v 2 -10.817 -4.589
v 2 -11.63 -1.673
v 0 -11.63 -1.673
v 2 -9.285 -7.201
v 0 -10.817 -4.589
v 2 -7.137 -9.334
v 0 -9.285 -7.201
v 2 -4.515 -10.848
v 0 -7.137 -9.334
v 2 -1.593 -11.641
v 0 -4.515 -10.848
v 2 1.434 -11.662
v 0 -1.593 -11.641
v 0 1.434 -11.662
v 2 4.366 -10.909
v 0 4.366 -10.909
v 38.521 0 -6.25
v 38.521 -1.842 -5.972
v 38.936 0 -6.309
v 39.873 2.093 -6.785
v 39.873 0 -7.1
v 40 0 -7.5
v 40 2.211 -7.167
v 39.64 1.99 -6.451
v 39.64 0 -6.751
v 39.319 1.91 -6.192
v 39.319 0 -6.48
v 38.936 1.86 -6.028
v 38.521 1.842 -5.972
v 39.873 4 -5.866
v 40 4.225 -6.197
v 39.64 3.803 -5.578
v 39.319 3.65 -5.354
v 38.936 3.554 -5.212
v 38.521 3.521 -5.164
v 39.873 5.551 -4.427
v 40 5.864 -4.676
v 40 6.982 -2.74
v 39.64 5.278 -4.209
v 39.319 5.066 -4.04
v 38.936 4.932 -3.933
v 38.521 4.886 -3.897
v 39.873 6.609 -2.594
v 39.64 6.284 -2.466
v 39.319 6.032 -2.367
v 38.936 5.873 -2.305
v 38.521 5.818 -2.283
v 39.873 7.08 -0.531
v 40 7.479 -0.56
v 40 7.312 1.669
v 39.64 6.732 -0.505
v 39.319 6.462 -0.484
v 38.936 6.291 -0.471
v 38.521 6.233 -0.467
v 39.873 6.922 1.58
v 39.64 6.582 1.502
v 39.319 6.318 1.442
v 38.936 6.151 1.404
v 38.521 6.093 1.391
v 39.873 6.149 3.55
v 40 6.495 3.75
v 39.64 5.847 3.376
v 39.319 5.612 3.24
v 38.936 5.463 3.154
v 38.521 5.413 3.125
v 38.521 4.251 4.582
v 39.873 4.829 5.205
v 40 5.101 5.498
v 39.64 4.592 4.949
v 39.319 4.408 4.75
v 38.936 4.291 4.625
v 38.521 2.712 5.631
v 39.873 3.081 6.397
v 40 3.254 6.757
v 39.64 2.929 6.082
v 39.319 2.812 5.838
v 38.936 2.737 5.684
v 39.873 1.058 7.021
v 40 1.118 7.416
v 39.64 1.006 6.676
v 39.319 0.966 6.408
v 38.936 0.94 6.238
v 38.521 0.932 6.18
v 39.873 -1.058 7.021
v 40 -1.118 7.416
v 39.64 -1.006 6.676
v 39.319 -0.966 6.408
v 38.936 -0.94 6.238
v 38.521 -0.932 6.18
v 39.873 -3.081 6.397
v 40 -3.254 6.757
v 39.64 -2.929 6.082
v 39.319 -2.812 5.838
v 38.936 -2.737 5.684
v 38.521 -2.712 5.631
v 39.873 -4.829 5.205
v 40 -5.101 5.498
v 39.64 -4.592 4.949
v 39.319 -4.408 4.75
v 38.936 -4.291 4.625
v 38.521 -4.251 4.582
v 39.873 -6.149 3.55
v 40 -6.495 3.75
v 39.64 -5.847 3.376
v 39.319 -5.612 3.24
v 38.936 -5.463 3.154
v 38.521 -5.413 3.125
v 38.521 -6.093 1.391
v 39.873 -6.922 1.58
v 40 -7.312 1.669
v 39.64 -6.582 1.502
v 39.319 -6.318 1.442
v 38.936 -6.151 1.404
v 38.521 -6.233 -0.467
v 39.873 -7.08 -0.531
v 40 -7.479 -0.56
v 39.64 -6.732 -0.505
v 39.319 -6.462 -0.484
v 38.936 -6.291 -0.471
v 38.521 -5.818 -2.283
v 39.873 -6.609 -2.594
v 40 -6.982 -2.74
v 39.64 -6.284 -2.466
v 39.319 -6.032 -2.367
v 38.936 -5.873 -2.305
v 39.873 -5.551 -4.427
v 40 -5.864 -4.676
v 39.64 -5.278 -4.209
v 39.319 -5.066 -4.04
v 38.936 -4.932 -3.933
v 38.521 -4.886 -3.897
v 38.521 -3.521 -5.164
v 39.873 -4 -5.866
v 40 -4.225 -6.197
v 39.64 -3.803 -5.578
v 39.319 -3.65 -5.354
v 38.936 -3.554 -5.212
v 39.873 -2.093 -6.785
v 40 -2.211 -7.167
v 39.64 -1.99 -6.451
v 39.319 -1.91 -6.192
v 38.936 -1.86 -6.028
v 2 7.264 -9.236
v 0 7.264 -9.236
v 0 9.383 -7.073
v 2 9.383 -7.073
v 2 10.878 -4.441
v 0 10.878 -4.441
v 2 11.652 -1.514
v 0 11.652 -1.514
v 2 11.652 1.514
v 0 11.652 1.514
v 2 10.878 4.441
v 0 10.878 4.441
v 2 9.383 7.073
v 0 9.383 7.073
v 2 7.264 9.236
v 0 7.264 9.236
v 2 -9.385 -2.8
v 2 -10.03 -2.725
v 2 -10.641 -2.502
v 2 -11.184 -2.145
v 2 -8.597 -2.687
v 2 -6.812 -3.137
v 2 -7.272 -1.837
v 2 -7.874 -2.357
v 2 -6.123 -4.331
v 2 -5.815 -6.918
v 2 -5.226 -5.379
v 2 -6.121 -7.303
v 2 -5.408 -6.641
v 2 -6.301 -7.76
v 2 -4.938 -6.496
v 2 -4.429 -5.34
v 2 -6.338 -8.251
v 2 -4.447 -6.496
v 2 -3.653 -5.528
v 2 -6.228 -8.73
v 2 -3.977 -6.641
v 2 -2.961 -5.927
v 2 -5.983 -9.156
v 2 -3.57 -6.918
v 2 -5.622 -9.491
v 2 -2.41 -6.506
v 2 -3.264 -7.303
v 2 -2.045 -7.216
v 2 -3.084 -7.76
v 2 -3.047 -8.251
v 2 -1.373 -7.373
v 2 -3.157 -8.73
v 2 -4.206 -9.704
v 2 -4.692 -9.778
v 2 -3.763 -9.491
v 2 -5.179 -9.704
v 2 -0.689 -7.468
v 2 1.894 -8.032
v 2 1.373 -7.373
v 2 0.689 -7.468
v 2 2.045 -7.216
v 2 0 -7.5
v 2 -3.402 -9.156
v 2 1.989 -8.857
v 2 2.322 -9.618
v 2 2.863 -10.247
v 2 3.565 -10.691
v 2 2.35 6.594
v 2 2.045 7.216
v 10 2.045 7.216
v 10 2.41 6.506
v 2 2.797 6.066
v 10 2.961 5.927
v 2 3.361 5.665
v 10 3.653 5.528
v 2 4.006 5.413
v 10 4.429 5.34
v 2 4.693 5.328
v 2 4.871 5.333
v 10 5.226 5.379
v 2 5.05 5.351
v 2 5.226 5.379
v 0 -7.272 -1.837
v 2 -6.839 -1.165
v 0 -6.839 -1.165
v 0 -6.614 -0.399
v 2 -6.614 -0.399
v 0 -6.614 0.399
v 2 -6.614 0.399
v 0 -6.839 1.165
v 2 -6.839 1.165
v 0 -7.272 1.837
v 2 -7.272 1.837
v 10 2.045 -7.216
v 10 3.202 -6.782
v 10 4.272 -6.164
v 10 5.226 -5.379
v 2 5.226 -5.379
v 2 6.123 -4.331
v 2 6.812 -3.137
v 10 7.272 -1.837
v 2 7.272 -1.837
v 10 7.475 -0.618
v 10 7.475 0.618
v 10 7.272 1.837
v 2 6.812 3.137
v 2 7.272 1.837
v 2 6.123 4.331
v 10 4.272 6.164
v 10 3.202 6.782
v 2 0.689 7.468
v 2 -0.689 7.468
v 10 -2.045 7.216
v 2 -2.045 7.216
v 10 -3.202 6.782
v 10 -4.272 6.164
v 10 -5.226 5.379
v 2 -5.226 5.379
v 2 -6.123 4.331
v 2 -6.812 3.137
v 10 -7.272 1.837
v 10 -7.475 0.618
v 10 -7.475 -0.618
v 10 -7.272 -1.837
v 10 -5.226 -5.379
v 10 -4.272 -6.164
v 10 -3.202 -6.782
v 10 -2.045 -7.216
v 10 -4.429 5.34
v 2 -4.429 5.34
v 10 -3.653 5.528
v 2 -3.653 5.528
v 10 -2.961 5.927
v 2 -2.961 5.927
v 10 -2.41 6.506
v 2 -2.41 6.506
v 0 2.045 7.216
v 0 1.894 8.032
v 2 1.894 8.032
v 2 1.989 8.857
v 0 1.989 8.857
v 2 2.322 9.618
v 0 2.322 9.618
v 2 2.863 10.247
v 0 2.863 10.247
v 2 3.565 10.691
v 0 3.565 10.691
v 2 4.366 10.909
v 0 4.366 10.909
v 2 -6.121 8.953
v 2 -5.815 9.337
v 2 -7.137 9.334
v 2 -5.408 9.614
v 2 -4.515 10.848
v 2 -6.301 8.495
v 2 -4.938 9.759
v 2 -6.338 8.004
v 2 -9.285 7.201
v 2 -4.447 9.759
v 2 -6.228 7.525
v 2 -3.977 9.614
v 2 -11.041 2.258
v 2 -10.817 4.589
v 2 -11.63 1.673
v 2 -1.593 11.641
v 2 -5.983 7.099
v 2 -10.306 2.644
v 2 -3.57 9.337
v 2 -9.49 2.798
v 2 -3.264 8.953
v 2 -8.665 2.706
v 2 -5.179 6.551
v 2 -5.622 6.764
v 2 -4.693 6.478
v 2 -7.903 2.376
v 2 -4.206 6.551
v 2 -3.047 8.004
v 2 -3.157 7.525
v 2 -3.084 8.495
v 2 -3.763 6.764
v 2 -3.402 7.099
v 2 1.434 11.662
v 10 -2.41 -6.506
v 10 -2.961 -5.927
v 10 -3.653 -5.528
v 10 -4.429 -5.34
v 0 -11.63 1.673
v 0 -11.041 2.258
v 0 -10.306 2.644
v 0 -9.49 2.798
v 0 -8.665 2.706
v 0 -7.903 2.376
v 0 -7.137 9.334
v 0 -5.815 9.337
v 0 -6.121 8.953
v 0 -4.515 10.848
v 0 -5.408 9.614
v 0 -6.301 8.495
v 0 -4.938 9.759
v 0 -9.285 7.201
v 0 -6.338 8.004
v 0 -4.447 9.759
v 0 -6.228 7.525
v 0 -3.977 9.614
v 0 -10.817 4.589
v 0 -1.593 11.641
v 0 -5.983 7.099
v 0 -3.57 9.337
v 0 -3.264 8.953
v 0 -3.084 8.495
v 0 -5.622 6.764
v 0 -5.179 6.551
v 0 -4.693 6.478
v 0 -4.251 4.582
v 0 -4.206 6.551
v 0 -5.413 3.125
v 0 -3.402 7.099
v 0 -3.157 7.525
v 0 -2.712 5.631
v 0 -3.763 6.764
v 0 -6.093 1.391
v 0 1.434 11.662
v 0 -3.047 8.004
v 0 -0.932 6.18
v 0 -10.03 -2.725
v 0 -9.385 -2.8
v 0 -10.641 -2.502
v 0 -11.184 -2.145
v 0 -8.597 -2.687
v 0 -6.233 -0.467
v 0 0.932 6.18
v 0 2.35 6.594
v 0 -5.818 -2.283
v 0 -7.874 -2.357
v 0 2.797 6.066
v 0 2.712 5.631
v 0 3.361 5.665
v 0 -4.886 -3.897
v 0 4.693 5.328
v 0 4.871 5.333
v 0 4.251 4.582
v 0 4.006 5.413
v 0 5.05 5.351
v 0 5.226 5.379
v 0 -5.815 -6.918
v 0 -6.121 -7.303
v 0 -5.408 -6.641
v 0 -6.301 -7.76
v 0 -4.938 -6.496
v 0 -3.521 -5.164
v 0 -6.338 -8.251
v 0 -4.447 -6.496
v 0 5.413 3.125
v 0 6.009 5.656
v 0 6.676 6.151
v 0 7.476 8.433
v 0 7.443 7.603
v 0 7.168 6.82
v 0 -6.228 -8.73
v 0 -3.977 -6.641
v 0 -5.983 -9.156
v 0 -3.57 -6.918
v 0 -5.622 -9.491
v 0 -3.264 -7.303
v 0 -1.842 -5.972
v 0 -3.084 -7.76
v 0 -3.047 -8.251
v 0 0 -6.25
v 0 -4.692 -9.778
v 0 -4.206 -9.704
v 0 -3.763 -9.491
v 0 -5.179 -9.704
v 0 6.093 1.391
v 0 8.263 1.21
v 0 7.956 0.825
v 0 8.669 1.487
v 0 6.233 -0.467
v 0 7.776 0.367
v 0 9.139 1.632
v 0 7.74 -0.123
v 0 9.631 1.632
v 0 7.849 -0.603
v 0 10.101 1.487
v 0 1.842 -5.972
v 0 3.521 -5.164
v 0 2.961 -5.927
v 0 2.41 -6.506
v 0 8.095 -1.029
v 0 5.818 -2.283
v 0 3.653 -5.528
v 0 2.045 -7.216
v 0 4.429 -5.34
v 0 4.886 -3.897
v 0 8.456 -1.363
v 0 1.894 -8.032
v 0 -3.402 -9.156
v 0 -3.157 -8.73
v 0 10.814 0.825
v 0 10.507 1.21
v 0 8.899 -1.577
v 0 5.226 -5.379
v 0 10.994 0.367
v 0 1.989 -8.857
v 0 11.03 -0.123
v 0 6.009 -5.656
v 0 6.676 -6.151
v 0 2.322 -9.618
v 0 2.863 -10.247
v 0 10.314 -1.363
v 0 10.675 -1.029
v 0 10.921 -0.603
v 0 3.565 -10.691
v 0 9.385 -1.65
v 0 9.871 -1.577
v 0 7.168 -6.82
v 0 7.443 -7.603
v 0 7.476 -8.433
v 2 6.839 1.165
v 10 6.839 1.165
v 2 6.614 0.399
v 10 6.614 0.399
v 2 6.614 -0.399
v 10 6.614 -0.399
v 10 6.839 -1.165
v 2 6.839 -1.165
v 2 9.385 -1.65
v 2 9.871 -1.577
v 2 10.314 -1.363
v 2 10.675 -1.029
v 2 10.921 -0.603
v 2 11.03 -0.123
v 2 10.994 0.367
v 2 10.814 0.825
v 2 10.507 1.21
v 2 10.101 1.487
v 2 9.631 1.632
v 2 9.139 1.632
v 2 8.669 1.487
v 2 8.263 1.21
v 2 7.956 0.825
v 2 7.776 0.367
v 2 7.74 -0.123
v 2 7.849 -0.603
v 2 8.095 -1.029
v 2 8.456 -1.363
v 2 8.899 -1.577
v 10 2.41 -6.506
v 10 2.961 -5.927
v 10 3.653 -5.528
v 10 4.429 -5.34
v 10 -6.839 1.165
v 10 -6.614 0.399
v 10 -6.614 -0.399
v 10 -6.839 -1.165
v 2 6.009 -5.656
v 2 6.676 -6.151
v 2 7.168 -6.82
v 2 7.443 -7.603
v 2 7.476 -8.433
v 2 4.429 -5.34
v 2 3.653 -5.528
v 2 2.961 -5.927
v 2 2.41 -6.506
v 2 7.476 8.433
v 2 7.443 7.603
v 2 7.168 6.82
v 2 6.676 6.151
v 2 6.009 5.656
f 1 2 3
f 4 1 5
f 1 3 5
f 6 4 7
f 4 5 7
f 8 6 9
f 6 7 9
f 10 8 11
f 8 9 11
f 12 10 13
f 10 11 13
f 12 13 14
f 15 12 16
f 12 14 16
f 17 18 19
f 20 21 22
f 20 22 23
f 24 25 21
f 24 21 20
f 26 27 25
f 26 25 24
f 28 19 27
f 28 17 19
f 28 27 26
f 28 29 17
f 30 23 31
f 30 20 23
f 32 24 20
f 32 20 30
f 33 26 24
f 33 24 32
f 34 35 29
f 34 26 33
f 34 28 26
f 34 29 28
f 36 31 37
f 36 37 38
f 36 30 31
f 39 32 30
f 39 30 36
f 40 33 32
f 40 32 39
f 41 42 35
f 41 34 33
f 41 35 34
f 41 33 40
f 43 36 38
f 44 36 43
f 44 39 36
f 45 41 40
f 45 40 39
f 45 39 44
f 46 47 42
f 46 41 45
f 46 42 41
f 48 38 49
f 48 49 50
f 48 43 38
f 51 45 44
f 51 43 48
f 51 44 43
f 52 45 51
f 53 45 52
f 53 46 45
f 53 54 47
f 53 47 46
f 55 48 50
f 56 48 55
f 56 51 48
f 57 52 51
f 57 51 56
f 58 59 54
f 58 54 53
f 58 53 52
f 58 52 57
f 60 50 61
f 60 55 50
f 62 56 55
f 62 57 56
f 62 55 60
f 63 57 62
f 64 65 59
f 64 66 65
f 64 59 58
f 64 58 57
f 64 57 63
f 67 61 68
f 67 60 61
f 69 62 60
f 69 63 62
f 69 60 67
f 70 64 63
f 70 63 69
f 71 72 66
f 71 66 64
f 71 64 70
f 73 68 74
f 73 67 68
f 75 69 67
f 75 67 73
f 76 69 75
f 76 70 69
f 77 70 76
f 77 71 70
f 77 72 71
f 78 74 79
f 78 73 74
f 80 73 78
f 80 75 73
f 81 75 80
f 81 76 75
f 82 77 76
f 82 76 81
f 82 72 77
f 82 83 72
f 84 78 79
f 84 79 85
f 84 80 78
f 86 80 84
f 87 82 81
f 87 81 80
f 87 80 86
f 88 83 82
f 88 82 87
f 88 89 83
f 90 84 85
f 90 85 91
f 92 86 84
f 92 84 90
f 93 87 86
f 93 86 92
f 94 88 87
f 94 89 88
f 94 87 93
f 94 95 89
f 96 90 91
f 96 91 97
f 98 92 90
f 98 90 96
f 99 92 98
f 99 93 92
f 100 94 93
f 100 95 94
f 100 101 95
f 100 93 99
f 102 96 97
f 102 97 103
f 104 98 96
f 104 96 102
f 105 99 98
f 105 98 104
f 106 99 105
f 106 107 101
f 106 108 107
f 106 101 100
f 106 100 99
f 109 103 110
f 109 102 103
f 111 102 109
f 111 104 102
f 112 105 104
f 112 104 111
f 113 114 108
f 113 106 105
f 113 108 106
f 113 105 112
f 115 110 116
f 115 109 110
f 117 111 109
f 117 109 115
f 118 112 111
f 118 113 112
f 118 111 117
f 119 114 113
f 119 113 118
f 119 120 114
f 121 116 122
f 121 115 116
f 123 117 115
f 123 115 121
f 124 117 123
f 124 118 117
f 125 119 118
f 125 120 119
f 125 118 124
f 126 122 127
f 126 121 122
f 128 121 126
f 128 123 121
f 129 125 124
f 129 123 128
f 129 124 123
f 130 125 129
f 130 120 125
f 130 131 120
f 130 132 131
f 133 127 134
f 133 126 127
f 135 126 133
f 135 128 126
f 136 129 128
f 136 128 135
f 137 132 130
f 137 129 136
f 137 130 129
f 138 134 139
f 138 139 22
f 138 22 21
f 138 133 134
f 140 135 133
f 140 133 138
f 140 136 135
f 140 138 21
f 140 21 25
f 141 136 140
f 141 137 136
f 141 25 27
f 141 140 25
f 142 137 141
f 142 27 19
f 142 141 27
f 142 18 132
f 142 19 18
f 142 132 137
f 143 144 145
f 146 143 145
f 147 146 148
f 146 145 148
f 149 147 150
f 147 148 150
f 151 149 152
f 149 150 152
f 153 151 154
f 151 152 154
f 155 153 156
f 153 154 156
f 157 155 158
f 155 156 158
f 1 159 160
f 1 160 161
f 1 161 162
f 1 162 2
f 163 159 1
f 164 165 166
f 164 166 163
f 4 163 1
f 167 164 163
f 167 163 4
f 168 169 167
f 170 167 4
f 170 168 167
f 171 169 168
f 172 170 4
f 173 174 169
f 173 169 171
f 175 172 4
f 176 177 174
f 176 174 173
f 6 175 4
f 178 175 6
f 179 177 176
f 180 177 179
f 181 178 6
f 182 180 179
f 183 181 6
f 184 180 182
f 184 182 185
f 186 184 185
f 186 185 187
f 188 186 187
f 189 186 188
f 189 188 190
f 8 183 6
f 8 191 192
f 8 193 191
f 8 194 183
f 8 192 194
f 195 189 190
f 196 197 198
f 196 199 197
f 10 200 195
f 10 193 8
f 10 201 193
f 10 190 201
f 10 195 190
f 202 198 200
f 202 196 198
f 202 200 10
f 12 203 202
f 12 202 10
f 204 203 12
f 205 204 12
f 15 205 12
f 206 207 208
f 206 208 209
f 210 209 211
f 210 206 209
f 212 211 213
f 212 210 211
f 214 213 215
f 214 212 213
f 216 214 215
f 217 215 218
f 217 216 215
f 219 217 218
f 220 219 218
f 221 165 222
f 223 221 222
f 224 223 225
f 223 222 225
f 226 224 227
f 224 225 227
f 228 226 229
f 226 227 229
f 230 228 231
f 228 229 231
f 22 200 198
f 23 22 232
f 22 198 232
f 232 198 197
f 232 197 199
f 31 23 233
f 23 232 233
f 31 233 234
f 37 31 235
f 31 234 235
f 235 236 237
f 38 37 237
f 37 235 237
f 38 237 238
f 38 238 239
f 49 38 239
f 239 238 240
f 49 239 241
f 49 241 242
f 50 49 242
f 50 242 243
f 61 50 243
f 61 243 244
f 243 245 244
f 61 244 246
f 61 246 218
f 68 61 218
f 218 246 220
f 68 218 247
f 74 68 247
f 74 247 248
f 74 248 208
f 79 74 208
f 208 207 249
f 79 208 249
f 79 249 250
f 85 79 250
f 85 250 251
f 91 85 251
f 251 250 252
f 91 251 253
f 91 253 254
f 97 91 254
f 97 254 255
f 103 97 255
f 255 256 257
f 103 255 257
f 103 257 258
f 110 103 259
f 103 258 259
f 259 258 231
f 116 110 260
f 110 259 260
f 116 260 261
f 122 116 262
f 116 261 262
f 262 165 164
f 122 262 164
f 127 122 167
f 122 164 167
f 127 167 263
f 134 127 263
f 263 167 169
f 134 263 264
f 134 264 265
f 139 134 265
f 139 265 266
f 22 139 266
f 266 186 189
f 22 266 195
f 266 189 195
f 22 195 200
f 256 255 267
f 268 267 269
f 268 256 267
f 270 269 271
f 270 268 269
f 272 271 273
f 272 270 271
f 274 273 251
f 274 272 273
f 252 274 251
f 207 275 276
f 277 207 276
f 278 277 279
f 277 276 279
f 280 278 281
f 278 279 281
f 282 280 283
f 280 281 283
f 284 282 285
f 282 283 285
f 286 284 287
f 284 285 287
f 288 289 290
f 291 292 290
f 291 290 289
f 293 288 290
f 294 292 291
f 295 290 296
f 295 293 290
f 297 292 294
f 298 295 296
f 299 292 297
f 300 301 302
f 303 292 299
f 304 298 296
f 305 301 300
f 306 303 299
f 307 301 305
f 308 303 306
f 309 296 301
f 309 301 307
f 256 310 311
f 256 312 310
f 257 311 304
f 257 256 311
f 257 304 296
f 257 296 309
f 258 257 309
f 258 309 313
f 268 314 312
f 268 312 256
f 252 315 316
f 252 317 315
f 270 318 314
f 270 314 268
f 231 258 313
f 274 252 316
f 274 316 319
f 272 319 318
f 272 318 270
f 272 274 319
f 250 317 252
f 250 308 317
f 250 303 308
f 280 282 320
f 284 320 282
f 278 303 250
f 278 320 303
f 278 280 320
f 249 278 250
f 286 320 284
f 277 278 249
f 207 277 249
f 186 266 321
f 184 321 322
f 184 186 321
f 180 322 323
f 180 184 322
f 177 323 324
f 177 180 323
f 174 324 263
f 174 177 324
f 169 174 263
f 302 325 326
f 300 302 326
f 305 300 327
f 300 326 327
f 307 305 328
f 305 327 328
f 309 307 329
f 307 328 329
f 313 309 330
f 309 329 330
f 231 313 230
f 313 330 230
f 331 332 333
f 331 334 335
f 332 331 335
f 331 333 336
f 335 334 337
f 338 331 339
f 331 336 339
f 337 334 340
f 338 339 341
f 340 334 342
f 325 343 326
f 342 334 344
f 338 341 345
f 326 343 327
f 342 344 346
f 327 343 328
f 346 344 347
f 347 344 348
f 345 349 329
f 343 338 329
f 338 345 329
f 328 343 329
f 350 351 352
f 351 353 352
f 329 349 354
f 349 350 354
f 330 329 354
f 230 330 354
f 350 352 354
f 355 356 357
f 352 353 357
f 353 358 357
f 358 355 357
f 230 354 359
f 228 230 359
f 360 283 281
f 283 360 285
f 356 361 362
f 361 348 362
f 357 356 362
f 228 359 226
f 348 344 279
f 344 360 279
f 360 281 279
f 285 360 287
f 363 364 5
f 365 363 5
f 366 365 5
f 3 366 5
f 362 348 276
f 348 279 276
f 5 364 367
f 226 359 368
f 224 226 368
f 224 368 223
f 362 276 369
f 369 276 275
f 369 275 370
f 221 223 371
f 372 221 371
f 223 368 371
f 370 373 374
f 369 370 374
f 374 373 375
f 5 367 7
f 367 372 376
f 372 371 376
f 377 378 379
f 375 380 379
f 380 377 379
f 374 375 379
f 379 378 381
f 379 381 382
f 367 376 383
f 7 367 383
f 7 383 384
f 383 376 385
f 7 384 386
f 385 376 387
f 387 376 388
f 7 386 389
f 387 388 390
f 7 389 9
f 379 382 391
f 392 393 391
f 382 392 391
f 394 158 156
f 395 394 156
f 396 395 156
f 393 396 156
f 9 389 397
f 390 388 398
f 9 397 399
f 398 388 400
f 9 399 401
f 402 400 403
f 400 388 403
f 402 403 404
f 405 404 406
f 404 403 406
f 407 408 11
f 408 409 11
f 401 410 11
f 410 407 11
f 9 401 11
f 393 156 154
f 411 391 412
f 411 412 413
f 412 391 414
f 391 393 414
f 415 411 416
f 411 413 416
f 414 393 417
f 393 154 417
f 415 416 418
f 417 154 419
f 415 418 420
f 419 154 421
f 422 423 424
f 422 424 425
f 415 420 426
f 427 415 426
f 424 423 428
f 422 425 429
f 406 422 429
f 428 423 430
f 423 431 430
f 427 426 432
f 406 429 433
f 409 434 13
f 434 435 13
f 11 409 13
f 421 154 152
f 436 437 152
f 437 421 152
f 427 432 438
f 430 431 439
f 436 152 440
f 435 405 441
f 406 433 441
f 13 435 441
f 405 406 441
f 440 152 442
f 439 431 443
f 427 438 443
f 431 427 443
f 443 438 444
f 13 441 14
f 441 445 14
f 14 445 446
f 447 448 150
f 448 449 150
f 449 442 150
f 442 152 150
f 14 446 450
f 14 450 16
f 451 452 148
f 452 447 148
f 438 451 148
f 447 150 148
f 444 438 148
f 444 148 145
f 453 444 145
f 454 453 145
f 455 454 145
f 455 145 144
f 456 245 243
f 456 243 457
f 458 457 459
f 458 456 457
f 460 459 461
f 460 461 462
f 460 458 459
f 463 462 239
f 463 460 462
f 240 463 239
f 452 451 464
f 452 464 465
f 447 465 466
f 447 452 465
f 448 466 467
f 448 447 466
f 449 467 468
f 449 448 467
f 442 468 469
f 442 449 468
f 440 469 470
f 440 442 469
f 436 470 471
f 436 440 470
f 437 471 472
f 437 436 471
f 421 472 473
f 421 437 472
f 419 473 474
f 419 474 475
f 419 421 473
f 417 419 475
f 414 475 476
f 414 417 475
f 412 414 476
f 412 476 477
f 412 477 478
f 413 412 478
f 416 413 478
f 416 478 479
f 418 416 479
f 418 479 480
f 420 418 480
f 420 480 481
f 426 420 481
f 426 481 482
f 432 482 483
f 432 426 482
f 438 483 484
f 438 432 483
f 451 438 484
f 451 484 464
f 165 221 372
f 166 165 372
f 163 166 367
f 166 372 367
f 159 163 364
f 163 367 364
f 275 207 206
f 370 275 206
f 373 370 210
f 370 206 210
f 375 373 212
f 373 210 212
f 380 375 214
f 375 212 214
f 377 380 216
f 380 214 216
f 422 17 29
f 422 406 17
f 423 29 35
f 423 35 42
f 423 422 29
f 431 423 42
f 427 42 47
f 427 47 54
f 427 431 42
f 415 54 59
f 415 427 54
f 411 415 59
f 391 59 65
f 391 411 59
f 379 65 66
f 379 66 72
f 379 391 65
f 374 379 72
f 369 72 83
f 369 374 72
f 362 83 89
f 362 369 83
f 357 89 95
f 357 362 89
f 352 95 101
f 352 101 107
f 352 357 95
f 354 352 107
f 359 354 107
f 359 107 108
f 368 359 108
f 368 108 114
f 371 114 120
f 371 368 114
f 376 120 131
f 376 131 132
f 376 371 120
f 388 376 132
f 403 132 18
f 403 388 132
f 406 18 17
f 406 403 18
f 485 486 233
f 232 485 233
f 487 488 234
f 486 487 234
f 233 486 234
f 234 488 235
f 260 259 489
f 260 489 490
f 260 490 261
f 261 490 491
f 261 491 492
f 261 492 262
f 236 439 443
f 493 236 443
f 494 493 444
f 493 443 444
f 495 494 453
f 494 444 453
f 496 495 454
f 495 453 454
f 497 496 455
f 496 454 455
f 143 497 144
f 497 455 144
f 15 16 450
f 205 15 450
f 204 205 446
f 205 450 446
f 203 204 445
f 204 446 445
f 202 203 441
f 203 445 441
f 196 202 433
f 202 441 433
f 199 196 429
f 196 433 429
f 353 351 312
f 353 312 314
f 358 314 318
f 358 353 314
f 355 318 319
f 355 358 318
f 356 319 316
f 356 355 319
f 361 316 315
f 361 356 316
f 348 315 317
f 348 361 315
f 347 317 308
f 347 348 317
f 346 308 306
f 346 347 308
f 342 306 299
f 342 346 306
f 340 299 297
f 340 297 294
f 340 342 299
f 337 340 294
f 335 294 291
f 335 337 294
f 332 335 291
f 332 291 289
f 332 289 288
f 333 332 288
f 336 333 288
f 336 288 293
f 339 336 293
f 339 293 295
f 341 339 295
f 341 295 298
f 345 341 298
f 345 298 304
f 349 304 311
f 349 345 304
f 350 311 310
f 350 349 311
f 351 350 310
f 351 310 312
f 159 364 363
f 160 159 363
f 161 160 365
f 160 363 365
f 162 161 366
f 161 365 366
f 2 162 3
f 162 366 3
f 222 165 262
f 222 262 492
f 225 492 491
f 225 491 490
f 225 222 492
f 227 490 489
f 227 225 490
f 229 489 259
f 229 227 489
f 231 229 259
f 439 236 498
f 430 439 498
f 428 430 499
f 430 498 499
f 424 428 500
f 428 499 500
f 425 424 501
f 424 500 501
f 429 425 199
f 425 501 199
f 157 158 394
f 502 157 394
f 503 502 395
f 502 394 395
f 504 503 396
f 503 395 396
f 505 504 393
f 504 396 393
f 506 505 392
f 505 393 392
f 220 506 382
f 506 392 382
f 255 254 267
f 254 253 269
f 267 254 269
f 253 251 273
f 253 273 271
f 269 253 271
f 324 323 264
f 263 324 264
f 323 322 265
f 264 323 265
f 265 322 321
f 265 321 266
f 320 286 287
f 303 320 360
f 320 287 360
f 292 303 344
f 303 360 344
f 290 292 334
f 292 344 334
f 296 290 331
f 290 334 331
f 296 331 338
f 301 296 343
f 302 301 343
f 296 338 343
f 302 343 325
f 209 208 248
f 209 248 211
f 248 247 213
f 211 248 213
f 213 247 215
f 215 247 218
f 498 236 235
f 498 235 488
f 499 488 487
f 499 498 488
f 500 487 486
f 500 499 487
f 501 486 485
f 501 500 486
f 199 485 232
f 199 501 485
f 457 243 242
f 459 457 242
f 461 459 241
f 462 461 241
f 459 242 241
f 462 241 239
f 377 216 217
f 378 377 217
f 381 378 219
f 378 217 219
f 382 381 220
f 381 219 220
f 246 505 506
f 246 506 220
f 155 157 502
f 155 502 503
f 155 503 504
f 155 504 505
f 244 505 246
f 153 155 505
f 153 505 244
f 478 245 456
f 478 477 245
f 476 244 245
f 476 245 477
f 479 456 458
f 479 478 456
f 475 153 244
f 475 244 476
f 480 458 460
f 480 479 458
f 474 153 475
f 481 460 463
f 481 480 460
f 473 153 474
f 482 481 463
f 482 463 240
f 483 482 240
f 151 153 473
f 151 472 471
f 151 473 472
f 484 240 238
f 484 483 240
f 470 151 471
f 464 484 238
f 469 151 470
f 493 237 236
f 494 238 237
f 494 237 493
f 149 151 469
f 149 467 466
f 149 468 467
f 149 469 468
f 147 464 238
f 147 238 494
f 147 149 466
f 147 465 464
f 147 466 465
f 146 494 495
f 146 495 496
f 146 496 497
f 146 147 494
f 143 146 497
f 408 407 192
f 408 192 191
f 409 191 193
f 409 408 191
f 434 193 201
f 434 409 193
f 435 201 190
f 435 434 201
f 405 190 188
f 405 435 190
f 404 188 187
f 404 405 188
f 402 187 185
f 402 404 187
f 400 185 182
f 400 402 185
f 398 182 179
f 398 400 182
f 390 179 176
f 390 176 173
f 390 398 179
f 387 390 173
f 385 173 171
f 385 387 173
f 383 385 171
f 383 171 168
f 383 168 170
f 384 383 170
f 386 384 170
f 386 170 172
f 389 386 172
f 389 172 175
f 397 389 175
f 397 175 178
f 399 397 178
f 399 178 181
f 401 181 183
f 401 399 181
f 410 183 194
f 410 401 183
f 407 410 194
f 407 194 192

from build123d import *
from build123d.topology import SkipClean

# Parameters (mm, degrees)
SKETCH1_R                 = 1.6500000000000006
SKETCH1_R_2               = 6.25
SKETCH1_R_3               = 1.6500000000000004
BOSS_EXTRUDE1_DEPTH       = 2
BOSS_EXTRUDE2_START       = 2
BOSS_EXTRUDE2_OUTLINE_R   = 7.5
BOSS_EXTRUDE2_OUTLINE_R_2 = 6.25
BOSS_EXTRUDE2_DEPTH       = 38
CUT_EXTRUDE2_START        = 2
SKETCH1_4_R               = 2.8
SKETCH1_4_R_2             = 2.8000000000000003
SKETCH1_4_R_3             = 2.7999999999999994
SKETCH1_4_R_4             = 2.8000000000000016
CUT_EXTRUDE2_DEPTH        = 8
CUT_EXTRUDE3_START        = 2
SKETCH1_5_R               = 2.8
SKETCH1_5_R_2             = 2.7999999999999994
SKETCH1_5_R_3             = 2.8000000000000016
CUT_EXTRUDE3_DEPTH        = 46.314258622305886
FILLET1_R                 = 1.5


# Read off the part's stored shape, not the designer's step: Boss-Extrude2
with BuildPart() as part:
    # Sketch1 → Boss-Extrude1 (new body)
    with BuildSketch(Plane(origin=(0, 0, 0), x_dir=(0, 0, -1), z_dir=(1, 0, 0))):
        with BuildLine():
            ThreePointArc((-9.235679756024062, 7.263932780812693), (-6.819714318196267, 7.1682440093196265), (-5.379034853060263, 5.226469558848167))
            ThreePointArc((-5.37903485305997, 5.226469558848125), (-6.495190528383201, 3.7500000000001563), (-7.215772836598412, 2.0451460511681123))
            ThreePointArc((-7.215772836598439, 2.0451460511681465), (-9.617738571694561, 2.3219238414507375), (-10.908590197578363, 4.366366899528586))
            ThreePointArc((-10.908590197578294, 4.366366899528582), (-10.175798494467182, -5.8749999999999565), (-1.672910441554004, -11.630299680340986))
            ThreePointArc((-1.6729104415540204, -11.630299680341029), (-2.7980242534982347, -9.490167850770279), (-1.836737983538199, -7.271615610016004))
            ThreePointArc((-1.8367379835382087, -7.271615610015976), (-1.38e-15, -7.500000000000001), (1.8367379835382058, -7.271615610015976))
            ThreePointArc((1.8367379835381987, -7.271615610016002), (2.798024253498237, -9.49016785077028), (1.6729104415540168, -11.630299680341032))
            ThreePointArc((1.672910441553996, -11.630299680340986), (10.175798494467136, -5.8750000000000355), (10.908590197578357, 4.366366899528418))
            ThreePointArc((10.908590197578427, 4.3663668995284235), (9.617738571694534, 2.3219238414505634), (7.215772836598344, 2.0451460511680883))
            ThreePointArc((7.2157728365984, 2.0451460511681567), (6.495190528383213, 3.7500000000001346), (5.379034853060037, 5.226469558848057))
            ThreePointArc((5.379034853060338, 5.226469558848102), (6.81971431819637, 7.168244009319535), (9.235679756024162, 7.263932780812571))
            ThreePointArc((9.235679756024219, 7.263932780812644), (7.994e-14, 11.750000000000004), (-9.235679756024119, 7.26393278081277))
        make_face()
        with Locations((-8.127648414516955, -4.692500000000004)):
            Circle(SKETCH1_R, mode=Mode.SUBTRACT)
        Circle(SKETCH1_R_2, mode=Mode.SUBTRACT)
        with Locations((8.127648414516958, -4.692499999999999)):
            Circle(SKETCH1_R, mode=Mode.SUBTRACT)
        with Locations((-1.7e-16, 9.385)):
            Circle(SKETCH1_R_3, mode=Mode.SUBTRACT)
    extrude(amount=BOSS_EXTRUDE1_DEPTH)

    # Boss-Extrude2 outline → Boss-Extrude2 (add)
    with BuildSketch(Plane(origin=(0, 0, 0), x_dir=(0, 0, -1), z_dir=(1, 0, 0)).offset(BOSS_EXTRUDE2_START)):
        Circle(BOSS_EXTRUDE2_OUTLINE_R)
        Circle(BOSS_EXTRUDE2_OUTLINE_R_2, mode=Mode.SUBTRACT)
    extrude(amount=BOSS_EXTRUDE2_DEPTH)

    # Sketch1<4> → Cut-Extrude2 (cut)
    with BuildSketch(Plane(origin=(0, 0, 0), x_dir=(0, 0, -1), z_dir=(1, 0, 0)).offset(CUT_EXTRUDE2_START)):
        with Locations((1.15e-15, -9.385)):
            Circle(SKETCH1_4_R)
        with Locations((-8.127648414517033, -4.692499999999865)):
            Circle(SKETCH1_4_R_2)
        with Locations((-8.127648414516935, 4.692500000000037)):
            Circle(SKETCH1_4_R_3)
        with Locations((6.439e-14, 9.385)):
            Circle(SKETCH1_4_R)
        with Locations((8.127648414517003, 4.692499999999925)):
            Circle(SKETCH1_4_R_4)
        with Locations((8.127648414516901, -4.692500000000093)):
            Circle(SKETCH1_4_R_3)
    extrude(amount=CUT_EXTRUDE2_DEPTH, mode=Mode.SUBTRACT)

    # Sketch1<5> → Cut-Extrude3 (cut, through all)
    with SkipClean():  # the faces are left unmerged after this step: merging them gives an invalid solid
        with BuildSketch(Plane(origin=(0, 0, 0), x_dir=(0, 0, -1), z_dir=(1, 0, 0)).offset(CUT_EXTRUDE3_START)):
            with Locations((1.15e-15, -9.385)):
                Circle(SKETCH1_5_R)
            with Locations((-8.127648414516935, 4.692500000000037)):
                Circle(SKETCH1_5_R_2)
            with Locations((8.127648414517003, 4.692499999999925)):
                Circle(SKETCH1_5_R_3)
        extrude(amount=-CUT_EXTRUDE3_DEPTH, mode=Mode.SUBTRACT)

    # Fillet1
    # the kernel refuses this fillet: 1.5 mm, written as the material it takes off along each edge
    with BuildSketch(Plane(origin=(40, 0, 0), x_dir=(0, 0, -1), z_dir=(0, -1, 0))) as fillet1_piece_1:
        with BuildLine():
            CenterArc((7.75, -1.4790199457750504), FILLET1_R, 99.59406822685953, 80.40593177314048)
            Line((7.500000000000024, -1.4211e-13), (7.495000000000024, 0.02958039891535691))
            ThreePointArc((7.495000000000024, 0.02958039891535691), (6.875000000000012, 0.03000000000000114), (6.25, 0.03000000000000114))
            Line((6.25, 0.03000000000000114), (6.22, 0))
            Line((6.22, 0), (6.22, -1.4790199457750504))
            Line((6.22, -1.4790199457750504), (6.25, -1.4790199457750504))
        make_face()
    revolve(axis=Axis((40, 0, 0), (1, 0, 0)), mode=Mode.SUBTRACT)


solid = part.part
